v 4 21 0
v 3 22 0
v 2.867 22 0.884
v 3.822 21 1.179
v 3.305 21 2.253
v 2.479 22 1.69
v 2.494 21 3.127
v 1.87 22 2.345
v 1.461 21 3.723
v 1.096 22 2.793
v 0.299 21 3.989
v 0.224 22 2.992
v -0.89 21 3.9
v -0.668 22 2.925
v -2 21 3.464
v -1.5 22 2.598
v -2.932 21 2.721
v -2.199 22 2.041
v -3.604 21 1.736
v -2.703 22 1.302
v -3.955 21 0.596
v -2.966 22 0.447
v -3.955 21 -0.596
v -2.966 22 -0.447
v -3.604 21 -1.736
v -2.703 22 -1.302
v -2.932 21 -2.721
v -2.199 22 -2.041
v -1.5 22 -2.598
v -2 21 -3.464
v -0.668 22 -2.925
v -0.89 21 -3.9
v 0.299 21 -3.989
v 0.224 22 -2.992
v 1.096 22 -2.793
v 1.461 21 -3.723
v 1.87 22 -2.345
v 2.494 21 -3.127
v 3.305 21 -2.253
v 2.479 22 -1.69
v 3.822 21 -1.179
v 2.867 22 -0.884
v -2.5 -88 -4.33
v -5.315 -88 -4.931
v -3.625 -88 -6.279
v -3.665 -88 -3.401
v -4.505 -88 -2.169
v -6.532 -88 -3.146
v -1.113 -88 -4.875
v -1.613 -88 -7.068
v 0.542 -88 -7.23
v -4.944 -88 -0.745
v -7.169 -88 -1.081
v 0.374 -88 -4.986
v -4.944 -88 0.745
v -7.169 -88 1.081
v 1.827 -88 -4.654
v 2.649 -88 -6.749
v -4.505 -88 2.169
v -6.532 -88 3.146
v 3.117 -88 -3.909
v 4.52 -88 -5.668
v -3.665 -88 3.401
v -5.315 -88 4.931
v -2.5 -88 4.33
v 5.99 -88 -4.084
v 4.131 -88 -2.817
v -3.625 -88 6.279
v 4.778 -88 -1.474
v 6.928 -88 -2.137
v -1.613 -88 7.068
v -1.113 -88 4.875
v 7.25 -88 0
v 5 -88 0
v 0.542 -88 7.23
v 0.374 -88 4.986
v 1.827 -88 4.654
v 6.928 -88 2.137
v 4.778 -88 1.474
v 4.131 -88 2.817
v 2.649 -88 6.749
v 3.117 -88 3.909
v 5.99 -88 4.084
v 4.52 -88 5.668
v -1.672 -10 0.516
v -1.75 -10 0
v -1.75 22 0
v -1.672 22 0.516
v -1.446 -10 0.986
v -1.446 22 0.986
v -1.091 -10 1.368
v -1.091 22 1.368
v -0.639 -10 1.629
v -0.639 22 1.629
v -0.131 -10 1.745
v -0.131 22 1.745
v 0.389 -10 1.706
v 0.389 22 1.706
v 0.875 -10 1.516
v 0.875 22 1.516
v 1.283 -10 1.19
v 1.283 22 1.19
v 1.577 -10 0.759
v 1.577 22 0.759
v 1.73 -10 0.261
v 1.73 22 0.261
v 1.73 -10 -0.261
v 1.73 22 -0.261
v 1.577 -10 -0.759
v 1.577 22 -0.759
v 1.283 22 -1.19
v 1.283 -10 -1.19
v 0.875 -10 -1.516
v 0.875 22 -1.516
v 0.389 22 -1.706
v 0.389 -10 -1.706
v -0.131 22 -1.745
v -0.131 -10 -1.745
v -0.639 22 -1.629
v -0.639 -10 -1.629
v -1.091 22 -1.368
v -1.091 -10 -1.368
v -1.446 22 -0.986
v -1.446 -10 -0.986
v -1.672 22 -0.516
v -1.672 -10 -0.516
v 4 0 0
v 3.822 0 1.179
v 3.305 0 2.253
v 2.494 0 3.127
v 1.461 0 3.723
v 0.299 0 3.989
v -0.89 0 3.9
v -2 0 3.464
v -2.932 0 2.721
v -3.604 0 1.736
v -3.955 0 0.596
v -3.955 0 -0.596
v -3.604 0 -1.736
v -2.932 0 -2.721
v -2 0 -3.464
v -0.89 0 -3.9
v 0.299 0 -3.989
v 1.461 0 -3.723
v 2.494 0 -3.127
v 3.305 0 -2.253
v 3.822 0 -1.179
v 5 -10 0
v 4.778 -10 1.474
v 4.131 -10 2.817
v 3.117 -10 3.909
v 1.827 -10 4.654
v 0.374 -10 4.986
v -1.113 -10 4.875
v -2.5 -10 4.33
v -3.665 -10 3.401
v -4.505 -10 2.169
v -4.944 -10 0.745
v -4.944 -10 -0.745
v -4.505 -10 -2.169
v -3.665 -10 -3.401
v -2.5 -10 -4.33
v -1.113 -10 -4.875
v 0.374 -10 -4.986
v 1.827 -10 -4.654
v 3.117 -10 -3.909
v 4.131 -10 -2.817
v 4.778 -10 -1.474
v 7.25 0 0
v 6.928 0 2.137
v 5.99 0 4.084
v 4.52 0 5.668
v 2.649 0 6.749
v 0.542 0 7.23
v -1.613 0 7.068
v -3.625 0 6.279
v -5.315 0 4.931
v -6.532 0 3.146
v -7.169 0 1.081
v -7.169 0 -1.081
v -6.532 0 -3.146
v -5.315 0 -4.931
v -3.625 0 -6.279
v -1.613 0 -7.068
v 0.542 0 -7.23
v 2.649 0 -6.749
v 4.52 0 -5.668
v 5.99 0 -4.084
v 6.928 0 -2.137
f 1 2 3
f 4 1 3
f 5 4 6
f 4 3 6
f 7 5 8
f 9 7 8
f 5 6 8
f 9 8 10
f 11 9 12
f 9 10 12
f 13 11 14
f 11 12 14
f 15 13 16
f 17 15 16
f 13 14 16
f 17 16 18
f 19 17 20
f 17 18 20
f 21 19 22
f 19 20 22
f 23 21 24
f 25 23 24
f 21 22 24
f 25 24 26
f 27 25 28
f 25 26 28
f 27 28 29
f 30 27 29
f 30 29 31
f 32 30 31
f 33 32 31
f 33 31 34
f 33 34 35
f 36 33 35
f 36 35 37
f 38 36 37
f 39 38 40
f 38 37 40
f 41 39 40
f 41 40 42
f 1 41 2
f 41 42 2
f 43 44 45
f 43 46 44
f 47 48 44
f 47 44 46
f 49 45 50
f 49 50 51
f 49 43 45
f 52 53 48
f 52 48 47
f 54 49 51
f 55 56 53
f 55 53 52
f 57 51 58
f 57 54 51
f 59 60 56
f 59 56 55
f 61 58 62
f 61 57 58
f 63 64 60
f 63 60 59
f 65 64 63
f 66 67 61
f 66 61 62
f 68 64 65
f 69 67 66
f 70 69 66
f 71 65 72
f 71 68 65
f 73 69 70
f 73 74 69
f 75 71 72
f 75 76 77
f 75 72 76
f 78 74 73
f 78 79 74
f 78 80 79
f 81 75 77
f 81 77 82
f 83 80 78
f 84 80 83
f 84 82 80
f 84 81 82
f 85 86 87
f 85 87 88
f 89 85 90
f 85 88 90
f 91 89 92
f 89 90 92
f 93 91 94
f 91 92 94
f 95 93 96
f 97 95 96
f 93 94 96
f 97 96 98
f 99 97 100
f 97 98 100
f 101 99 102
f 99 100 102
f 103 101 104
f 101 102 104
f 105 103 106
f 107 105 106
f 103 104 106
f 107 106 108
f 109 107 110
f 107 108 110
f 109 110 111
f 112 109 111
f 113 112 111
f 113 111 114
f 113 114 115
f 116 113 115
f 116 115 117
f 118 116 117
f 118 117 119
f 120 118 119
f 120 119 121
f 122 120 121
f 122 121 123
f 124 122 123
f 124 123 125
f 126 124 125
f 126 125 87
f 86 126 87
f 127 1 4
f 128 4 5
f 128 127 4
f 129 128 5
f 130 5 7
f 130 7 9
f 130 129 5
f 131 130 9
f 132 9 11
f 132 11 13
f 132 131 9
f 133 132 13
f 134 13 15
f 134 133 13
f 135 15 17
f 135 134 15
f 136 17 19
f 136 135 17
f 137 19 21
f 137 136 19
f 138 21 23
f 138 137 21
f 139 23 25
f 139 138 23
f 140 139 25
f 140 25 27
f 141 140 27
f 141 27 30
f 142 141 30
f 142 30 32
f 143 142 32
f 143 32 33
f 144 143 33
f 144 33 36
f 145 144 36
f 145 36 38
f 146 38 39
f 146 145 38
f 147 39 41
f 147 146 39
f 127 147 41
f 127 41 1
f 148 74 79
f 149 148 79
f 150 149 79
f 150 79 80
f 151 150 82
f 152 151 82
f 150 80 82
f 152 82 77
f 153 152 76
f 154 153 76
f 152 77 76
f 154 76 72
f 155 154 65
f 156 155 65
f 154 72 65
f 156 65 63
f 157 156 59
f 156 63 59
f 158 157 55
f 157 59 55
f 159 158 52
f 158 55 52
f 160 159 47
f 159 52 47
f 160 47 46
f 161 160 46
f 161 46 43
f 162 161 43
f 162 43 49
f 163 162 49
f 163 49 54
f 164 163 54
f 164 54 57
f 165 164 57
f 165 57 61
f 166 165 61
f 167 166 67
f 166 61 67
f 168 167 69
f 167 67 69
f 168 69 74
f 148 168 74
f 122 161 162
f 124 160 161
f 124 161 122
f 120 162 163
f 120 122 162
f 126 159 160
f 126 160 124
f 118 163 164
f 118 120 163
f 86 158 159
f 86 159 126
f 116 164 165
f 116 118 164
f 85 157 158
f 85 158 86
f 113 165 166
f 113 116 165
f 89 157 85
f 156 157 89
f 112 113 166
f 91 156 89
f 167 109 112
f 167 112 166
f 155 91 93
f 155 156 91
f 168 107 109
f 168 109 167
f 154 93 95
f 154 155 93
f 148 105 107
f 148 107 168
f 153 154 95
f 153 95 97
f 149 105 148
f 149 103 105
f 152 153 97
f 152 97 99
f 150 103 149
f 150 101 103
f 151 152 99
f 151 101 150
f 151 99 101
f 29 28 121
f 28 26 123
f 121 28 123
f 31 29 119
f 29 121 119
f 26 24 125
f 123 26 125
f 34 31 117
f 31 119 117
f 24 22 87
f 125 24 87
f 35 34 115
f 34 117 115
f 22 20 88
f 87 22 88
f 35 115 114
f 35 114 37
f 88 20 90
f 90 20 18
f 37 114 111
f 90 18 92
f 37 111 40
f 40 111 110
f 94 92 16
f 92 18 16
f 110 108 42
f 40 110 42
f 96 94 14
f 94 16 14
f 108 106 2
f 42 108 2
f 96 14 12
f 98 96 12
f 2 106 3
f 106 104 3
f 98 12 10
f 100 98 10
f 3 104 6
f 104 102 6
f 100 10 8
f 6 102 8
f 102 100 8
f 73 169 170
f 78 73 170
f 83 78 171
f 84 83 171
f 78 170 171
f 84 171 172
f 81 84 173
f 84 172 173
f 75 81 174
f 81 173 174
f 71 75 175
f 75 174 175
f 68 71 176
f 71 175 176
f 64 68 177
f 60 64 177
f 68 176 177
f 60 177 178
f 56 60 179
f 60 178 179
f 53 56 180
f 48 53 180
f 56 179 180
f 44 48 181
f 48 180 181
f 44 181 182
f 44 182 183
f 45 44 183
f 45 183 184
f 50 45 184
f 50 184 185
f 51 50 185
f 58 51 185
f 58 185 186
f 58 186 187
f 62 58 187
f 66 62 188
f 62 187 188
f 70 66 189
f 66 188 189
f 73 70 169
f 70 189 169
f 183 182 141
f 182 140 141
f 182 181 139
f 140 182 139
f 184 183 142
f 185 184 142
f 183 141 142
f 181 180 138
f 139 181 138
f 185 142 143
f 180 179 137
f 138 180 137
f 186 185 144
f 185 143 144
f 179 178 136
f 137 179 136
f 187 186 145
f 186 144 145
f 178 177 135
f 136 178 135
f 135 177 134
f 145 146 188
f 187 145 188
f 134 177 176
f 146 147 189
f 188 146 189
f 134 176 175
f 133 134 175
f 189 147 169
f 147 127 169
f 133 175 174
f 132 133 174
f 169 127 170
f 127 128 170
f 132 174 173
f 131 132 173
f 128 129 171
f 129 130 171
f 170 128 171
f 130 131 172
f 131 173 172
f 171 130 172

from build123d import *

# Parameters (mm, degrees)
F0_R     = 7.25
F1_DEPTH = 88
F2_R     = 4
F3_DEPTH = 22
F4_SIZE  = 1
F5_R     = 1.75
F6_DEPTH = 120
F7_R     = 5
F8_DEPTH = 78


with BuildPart() as f1:
    # F0 (on Front) → F1 (new body)
    with BuildSketch(Plane.XZ):
        Circle(F0_R)
    extrude(amount=F1_DEPTH)

    # F2 (on Front) → F3 (join)
    with BuildSketch(Plane.XZ):
        Circle(F2_R)
    extrude(amount=-F3_DEPTH)

    # F4
    f4_edges = [f1.edges().sort_by_distance(p)[0] for p in [
        (-4, 22, 0),
    ]]
    chamfer(f4_edges, length=F4_SIZE)

    # F5 (on face) → F6 (cut)
    with BuildSketch(Plane(origin=(0, 22, 0), x_dir=(-1, 0, 0), z_dir=(0, 1, 0))):
        Circle(F5_R)
    extrude(amount=-F6_DEPTH, mode=Mode.SUBTRACT)

    # F7 (on face) → F8 (cut)
    with BuildSketch(Plane.XZ.offset(88)):
        Circle(F7_R)
    extrude(amount=-F8_DEPTH, mode=Mode.SUBTRACT)


solid = f1.part
